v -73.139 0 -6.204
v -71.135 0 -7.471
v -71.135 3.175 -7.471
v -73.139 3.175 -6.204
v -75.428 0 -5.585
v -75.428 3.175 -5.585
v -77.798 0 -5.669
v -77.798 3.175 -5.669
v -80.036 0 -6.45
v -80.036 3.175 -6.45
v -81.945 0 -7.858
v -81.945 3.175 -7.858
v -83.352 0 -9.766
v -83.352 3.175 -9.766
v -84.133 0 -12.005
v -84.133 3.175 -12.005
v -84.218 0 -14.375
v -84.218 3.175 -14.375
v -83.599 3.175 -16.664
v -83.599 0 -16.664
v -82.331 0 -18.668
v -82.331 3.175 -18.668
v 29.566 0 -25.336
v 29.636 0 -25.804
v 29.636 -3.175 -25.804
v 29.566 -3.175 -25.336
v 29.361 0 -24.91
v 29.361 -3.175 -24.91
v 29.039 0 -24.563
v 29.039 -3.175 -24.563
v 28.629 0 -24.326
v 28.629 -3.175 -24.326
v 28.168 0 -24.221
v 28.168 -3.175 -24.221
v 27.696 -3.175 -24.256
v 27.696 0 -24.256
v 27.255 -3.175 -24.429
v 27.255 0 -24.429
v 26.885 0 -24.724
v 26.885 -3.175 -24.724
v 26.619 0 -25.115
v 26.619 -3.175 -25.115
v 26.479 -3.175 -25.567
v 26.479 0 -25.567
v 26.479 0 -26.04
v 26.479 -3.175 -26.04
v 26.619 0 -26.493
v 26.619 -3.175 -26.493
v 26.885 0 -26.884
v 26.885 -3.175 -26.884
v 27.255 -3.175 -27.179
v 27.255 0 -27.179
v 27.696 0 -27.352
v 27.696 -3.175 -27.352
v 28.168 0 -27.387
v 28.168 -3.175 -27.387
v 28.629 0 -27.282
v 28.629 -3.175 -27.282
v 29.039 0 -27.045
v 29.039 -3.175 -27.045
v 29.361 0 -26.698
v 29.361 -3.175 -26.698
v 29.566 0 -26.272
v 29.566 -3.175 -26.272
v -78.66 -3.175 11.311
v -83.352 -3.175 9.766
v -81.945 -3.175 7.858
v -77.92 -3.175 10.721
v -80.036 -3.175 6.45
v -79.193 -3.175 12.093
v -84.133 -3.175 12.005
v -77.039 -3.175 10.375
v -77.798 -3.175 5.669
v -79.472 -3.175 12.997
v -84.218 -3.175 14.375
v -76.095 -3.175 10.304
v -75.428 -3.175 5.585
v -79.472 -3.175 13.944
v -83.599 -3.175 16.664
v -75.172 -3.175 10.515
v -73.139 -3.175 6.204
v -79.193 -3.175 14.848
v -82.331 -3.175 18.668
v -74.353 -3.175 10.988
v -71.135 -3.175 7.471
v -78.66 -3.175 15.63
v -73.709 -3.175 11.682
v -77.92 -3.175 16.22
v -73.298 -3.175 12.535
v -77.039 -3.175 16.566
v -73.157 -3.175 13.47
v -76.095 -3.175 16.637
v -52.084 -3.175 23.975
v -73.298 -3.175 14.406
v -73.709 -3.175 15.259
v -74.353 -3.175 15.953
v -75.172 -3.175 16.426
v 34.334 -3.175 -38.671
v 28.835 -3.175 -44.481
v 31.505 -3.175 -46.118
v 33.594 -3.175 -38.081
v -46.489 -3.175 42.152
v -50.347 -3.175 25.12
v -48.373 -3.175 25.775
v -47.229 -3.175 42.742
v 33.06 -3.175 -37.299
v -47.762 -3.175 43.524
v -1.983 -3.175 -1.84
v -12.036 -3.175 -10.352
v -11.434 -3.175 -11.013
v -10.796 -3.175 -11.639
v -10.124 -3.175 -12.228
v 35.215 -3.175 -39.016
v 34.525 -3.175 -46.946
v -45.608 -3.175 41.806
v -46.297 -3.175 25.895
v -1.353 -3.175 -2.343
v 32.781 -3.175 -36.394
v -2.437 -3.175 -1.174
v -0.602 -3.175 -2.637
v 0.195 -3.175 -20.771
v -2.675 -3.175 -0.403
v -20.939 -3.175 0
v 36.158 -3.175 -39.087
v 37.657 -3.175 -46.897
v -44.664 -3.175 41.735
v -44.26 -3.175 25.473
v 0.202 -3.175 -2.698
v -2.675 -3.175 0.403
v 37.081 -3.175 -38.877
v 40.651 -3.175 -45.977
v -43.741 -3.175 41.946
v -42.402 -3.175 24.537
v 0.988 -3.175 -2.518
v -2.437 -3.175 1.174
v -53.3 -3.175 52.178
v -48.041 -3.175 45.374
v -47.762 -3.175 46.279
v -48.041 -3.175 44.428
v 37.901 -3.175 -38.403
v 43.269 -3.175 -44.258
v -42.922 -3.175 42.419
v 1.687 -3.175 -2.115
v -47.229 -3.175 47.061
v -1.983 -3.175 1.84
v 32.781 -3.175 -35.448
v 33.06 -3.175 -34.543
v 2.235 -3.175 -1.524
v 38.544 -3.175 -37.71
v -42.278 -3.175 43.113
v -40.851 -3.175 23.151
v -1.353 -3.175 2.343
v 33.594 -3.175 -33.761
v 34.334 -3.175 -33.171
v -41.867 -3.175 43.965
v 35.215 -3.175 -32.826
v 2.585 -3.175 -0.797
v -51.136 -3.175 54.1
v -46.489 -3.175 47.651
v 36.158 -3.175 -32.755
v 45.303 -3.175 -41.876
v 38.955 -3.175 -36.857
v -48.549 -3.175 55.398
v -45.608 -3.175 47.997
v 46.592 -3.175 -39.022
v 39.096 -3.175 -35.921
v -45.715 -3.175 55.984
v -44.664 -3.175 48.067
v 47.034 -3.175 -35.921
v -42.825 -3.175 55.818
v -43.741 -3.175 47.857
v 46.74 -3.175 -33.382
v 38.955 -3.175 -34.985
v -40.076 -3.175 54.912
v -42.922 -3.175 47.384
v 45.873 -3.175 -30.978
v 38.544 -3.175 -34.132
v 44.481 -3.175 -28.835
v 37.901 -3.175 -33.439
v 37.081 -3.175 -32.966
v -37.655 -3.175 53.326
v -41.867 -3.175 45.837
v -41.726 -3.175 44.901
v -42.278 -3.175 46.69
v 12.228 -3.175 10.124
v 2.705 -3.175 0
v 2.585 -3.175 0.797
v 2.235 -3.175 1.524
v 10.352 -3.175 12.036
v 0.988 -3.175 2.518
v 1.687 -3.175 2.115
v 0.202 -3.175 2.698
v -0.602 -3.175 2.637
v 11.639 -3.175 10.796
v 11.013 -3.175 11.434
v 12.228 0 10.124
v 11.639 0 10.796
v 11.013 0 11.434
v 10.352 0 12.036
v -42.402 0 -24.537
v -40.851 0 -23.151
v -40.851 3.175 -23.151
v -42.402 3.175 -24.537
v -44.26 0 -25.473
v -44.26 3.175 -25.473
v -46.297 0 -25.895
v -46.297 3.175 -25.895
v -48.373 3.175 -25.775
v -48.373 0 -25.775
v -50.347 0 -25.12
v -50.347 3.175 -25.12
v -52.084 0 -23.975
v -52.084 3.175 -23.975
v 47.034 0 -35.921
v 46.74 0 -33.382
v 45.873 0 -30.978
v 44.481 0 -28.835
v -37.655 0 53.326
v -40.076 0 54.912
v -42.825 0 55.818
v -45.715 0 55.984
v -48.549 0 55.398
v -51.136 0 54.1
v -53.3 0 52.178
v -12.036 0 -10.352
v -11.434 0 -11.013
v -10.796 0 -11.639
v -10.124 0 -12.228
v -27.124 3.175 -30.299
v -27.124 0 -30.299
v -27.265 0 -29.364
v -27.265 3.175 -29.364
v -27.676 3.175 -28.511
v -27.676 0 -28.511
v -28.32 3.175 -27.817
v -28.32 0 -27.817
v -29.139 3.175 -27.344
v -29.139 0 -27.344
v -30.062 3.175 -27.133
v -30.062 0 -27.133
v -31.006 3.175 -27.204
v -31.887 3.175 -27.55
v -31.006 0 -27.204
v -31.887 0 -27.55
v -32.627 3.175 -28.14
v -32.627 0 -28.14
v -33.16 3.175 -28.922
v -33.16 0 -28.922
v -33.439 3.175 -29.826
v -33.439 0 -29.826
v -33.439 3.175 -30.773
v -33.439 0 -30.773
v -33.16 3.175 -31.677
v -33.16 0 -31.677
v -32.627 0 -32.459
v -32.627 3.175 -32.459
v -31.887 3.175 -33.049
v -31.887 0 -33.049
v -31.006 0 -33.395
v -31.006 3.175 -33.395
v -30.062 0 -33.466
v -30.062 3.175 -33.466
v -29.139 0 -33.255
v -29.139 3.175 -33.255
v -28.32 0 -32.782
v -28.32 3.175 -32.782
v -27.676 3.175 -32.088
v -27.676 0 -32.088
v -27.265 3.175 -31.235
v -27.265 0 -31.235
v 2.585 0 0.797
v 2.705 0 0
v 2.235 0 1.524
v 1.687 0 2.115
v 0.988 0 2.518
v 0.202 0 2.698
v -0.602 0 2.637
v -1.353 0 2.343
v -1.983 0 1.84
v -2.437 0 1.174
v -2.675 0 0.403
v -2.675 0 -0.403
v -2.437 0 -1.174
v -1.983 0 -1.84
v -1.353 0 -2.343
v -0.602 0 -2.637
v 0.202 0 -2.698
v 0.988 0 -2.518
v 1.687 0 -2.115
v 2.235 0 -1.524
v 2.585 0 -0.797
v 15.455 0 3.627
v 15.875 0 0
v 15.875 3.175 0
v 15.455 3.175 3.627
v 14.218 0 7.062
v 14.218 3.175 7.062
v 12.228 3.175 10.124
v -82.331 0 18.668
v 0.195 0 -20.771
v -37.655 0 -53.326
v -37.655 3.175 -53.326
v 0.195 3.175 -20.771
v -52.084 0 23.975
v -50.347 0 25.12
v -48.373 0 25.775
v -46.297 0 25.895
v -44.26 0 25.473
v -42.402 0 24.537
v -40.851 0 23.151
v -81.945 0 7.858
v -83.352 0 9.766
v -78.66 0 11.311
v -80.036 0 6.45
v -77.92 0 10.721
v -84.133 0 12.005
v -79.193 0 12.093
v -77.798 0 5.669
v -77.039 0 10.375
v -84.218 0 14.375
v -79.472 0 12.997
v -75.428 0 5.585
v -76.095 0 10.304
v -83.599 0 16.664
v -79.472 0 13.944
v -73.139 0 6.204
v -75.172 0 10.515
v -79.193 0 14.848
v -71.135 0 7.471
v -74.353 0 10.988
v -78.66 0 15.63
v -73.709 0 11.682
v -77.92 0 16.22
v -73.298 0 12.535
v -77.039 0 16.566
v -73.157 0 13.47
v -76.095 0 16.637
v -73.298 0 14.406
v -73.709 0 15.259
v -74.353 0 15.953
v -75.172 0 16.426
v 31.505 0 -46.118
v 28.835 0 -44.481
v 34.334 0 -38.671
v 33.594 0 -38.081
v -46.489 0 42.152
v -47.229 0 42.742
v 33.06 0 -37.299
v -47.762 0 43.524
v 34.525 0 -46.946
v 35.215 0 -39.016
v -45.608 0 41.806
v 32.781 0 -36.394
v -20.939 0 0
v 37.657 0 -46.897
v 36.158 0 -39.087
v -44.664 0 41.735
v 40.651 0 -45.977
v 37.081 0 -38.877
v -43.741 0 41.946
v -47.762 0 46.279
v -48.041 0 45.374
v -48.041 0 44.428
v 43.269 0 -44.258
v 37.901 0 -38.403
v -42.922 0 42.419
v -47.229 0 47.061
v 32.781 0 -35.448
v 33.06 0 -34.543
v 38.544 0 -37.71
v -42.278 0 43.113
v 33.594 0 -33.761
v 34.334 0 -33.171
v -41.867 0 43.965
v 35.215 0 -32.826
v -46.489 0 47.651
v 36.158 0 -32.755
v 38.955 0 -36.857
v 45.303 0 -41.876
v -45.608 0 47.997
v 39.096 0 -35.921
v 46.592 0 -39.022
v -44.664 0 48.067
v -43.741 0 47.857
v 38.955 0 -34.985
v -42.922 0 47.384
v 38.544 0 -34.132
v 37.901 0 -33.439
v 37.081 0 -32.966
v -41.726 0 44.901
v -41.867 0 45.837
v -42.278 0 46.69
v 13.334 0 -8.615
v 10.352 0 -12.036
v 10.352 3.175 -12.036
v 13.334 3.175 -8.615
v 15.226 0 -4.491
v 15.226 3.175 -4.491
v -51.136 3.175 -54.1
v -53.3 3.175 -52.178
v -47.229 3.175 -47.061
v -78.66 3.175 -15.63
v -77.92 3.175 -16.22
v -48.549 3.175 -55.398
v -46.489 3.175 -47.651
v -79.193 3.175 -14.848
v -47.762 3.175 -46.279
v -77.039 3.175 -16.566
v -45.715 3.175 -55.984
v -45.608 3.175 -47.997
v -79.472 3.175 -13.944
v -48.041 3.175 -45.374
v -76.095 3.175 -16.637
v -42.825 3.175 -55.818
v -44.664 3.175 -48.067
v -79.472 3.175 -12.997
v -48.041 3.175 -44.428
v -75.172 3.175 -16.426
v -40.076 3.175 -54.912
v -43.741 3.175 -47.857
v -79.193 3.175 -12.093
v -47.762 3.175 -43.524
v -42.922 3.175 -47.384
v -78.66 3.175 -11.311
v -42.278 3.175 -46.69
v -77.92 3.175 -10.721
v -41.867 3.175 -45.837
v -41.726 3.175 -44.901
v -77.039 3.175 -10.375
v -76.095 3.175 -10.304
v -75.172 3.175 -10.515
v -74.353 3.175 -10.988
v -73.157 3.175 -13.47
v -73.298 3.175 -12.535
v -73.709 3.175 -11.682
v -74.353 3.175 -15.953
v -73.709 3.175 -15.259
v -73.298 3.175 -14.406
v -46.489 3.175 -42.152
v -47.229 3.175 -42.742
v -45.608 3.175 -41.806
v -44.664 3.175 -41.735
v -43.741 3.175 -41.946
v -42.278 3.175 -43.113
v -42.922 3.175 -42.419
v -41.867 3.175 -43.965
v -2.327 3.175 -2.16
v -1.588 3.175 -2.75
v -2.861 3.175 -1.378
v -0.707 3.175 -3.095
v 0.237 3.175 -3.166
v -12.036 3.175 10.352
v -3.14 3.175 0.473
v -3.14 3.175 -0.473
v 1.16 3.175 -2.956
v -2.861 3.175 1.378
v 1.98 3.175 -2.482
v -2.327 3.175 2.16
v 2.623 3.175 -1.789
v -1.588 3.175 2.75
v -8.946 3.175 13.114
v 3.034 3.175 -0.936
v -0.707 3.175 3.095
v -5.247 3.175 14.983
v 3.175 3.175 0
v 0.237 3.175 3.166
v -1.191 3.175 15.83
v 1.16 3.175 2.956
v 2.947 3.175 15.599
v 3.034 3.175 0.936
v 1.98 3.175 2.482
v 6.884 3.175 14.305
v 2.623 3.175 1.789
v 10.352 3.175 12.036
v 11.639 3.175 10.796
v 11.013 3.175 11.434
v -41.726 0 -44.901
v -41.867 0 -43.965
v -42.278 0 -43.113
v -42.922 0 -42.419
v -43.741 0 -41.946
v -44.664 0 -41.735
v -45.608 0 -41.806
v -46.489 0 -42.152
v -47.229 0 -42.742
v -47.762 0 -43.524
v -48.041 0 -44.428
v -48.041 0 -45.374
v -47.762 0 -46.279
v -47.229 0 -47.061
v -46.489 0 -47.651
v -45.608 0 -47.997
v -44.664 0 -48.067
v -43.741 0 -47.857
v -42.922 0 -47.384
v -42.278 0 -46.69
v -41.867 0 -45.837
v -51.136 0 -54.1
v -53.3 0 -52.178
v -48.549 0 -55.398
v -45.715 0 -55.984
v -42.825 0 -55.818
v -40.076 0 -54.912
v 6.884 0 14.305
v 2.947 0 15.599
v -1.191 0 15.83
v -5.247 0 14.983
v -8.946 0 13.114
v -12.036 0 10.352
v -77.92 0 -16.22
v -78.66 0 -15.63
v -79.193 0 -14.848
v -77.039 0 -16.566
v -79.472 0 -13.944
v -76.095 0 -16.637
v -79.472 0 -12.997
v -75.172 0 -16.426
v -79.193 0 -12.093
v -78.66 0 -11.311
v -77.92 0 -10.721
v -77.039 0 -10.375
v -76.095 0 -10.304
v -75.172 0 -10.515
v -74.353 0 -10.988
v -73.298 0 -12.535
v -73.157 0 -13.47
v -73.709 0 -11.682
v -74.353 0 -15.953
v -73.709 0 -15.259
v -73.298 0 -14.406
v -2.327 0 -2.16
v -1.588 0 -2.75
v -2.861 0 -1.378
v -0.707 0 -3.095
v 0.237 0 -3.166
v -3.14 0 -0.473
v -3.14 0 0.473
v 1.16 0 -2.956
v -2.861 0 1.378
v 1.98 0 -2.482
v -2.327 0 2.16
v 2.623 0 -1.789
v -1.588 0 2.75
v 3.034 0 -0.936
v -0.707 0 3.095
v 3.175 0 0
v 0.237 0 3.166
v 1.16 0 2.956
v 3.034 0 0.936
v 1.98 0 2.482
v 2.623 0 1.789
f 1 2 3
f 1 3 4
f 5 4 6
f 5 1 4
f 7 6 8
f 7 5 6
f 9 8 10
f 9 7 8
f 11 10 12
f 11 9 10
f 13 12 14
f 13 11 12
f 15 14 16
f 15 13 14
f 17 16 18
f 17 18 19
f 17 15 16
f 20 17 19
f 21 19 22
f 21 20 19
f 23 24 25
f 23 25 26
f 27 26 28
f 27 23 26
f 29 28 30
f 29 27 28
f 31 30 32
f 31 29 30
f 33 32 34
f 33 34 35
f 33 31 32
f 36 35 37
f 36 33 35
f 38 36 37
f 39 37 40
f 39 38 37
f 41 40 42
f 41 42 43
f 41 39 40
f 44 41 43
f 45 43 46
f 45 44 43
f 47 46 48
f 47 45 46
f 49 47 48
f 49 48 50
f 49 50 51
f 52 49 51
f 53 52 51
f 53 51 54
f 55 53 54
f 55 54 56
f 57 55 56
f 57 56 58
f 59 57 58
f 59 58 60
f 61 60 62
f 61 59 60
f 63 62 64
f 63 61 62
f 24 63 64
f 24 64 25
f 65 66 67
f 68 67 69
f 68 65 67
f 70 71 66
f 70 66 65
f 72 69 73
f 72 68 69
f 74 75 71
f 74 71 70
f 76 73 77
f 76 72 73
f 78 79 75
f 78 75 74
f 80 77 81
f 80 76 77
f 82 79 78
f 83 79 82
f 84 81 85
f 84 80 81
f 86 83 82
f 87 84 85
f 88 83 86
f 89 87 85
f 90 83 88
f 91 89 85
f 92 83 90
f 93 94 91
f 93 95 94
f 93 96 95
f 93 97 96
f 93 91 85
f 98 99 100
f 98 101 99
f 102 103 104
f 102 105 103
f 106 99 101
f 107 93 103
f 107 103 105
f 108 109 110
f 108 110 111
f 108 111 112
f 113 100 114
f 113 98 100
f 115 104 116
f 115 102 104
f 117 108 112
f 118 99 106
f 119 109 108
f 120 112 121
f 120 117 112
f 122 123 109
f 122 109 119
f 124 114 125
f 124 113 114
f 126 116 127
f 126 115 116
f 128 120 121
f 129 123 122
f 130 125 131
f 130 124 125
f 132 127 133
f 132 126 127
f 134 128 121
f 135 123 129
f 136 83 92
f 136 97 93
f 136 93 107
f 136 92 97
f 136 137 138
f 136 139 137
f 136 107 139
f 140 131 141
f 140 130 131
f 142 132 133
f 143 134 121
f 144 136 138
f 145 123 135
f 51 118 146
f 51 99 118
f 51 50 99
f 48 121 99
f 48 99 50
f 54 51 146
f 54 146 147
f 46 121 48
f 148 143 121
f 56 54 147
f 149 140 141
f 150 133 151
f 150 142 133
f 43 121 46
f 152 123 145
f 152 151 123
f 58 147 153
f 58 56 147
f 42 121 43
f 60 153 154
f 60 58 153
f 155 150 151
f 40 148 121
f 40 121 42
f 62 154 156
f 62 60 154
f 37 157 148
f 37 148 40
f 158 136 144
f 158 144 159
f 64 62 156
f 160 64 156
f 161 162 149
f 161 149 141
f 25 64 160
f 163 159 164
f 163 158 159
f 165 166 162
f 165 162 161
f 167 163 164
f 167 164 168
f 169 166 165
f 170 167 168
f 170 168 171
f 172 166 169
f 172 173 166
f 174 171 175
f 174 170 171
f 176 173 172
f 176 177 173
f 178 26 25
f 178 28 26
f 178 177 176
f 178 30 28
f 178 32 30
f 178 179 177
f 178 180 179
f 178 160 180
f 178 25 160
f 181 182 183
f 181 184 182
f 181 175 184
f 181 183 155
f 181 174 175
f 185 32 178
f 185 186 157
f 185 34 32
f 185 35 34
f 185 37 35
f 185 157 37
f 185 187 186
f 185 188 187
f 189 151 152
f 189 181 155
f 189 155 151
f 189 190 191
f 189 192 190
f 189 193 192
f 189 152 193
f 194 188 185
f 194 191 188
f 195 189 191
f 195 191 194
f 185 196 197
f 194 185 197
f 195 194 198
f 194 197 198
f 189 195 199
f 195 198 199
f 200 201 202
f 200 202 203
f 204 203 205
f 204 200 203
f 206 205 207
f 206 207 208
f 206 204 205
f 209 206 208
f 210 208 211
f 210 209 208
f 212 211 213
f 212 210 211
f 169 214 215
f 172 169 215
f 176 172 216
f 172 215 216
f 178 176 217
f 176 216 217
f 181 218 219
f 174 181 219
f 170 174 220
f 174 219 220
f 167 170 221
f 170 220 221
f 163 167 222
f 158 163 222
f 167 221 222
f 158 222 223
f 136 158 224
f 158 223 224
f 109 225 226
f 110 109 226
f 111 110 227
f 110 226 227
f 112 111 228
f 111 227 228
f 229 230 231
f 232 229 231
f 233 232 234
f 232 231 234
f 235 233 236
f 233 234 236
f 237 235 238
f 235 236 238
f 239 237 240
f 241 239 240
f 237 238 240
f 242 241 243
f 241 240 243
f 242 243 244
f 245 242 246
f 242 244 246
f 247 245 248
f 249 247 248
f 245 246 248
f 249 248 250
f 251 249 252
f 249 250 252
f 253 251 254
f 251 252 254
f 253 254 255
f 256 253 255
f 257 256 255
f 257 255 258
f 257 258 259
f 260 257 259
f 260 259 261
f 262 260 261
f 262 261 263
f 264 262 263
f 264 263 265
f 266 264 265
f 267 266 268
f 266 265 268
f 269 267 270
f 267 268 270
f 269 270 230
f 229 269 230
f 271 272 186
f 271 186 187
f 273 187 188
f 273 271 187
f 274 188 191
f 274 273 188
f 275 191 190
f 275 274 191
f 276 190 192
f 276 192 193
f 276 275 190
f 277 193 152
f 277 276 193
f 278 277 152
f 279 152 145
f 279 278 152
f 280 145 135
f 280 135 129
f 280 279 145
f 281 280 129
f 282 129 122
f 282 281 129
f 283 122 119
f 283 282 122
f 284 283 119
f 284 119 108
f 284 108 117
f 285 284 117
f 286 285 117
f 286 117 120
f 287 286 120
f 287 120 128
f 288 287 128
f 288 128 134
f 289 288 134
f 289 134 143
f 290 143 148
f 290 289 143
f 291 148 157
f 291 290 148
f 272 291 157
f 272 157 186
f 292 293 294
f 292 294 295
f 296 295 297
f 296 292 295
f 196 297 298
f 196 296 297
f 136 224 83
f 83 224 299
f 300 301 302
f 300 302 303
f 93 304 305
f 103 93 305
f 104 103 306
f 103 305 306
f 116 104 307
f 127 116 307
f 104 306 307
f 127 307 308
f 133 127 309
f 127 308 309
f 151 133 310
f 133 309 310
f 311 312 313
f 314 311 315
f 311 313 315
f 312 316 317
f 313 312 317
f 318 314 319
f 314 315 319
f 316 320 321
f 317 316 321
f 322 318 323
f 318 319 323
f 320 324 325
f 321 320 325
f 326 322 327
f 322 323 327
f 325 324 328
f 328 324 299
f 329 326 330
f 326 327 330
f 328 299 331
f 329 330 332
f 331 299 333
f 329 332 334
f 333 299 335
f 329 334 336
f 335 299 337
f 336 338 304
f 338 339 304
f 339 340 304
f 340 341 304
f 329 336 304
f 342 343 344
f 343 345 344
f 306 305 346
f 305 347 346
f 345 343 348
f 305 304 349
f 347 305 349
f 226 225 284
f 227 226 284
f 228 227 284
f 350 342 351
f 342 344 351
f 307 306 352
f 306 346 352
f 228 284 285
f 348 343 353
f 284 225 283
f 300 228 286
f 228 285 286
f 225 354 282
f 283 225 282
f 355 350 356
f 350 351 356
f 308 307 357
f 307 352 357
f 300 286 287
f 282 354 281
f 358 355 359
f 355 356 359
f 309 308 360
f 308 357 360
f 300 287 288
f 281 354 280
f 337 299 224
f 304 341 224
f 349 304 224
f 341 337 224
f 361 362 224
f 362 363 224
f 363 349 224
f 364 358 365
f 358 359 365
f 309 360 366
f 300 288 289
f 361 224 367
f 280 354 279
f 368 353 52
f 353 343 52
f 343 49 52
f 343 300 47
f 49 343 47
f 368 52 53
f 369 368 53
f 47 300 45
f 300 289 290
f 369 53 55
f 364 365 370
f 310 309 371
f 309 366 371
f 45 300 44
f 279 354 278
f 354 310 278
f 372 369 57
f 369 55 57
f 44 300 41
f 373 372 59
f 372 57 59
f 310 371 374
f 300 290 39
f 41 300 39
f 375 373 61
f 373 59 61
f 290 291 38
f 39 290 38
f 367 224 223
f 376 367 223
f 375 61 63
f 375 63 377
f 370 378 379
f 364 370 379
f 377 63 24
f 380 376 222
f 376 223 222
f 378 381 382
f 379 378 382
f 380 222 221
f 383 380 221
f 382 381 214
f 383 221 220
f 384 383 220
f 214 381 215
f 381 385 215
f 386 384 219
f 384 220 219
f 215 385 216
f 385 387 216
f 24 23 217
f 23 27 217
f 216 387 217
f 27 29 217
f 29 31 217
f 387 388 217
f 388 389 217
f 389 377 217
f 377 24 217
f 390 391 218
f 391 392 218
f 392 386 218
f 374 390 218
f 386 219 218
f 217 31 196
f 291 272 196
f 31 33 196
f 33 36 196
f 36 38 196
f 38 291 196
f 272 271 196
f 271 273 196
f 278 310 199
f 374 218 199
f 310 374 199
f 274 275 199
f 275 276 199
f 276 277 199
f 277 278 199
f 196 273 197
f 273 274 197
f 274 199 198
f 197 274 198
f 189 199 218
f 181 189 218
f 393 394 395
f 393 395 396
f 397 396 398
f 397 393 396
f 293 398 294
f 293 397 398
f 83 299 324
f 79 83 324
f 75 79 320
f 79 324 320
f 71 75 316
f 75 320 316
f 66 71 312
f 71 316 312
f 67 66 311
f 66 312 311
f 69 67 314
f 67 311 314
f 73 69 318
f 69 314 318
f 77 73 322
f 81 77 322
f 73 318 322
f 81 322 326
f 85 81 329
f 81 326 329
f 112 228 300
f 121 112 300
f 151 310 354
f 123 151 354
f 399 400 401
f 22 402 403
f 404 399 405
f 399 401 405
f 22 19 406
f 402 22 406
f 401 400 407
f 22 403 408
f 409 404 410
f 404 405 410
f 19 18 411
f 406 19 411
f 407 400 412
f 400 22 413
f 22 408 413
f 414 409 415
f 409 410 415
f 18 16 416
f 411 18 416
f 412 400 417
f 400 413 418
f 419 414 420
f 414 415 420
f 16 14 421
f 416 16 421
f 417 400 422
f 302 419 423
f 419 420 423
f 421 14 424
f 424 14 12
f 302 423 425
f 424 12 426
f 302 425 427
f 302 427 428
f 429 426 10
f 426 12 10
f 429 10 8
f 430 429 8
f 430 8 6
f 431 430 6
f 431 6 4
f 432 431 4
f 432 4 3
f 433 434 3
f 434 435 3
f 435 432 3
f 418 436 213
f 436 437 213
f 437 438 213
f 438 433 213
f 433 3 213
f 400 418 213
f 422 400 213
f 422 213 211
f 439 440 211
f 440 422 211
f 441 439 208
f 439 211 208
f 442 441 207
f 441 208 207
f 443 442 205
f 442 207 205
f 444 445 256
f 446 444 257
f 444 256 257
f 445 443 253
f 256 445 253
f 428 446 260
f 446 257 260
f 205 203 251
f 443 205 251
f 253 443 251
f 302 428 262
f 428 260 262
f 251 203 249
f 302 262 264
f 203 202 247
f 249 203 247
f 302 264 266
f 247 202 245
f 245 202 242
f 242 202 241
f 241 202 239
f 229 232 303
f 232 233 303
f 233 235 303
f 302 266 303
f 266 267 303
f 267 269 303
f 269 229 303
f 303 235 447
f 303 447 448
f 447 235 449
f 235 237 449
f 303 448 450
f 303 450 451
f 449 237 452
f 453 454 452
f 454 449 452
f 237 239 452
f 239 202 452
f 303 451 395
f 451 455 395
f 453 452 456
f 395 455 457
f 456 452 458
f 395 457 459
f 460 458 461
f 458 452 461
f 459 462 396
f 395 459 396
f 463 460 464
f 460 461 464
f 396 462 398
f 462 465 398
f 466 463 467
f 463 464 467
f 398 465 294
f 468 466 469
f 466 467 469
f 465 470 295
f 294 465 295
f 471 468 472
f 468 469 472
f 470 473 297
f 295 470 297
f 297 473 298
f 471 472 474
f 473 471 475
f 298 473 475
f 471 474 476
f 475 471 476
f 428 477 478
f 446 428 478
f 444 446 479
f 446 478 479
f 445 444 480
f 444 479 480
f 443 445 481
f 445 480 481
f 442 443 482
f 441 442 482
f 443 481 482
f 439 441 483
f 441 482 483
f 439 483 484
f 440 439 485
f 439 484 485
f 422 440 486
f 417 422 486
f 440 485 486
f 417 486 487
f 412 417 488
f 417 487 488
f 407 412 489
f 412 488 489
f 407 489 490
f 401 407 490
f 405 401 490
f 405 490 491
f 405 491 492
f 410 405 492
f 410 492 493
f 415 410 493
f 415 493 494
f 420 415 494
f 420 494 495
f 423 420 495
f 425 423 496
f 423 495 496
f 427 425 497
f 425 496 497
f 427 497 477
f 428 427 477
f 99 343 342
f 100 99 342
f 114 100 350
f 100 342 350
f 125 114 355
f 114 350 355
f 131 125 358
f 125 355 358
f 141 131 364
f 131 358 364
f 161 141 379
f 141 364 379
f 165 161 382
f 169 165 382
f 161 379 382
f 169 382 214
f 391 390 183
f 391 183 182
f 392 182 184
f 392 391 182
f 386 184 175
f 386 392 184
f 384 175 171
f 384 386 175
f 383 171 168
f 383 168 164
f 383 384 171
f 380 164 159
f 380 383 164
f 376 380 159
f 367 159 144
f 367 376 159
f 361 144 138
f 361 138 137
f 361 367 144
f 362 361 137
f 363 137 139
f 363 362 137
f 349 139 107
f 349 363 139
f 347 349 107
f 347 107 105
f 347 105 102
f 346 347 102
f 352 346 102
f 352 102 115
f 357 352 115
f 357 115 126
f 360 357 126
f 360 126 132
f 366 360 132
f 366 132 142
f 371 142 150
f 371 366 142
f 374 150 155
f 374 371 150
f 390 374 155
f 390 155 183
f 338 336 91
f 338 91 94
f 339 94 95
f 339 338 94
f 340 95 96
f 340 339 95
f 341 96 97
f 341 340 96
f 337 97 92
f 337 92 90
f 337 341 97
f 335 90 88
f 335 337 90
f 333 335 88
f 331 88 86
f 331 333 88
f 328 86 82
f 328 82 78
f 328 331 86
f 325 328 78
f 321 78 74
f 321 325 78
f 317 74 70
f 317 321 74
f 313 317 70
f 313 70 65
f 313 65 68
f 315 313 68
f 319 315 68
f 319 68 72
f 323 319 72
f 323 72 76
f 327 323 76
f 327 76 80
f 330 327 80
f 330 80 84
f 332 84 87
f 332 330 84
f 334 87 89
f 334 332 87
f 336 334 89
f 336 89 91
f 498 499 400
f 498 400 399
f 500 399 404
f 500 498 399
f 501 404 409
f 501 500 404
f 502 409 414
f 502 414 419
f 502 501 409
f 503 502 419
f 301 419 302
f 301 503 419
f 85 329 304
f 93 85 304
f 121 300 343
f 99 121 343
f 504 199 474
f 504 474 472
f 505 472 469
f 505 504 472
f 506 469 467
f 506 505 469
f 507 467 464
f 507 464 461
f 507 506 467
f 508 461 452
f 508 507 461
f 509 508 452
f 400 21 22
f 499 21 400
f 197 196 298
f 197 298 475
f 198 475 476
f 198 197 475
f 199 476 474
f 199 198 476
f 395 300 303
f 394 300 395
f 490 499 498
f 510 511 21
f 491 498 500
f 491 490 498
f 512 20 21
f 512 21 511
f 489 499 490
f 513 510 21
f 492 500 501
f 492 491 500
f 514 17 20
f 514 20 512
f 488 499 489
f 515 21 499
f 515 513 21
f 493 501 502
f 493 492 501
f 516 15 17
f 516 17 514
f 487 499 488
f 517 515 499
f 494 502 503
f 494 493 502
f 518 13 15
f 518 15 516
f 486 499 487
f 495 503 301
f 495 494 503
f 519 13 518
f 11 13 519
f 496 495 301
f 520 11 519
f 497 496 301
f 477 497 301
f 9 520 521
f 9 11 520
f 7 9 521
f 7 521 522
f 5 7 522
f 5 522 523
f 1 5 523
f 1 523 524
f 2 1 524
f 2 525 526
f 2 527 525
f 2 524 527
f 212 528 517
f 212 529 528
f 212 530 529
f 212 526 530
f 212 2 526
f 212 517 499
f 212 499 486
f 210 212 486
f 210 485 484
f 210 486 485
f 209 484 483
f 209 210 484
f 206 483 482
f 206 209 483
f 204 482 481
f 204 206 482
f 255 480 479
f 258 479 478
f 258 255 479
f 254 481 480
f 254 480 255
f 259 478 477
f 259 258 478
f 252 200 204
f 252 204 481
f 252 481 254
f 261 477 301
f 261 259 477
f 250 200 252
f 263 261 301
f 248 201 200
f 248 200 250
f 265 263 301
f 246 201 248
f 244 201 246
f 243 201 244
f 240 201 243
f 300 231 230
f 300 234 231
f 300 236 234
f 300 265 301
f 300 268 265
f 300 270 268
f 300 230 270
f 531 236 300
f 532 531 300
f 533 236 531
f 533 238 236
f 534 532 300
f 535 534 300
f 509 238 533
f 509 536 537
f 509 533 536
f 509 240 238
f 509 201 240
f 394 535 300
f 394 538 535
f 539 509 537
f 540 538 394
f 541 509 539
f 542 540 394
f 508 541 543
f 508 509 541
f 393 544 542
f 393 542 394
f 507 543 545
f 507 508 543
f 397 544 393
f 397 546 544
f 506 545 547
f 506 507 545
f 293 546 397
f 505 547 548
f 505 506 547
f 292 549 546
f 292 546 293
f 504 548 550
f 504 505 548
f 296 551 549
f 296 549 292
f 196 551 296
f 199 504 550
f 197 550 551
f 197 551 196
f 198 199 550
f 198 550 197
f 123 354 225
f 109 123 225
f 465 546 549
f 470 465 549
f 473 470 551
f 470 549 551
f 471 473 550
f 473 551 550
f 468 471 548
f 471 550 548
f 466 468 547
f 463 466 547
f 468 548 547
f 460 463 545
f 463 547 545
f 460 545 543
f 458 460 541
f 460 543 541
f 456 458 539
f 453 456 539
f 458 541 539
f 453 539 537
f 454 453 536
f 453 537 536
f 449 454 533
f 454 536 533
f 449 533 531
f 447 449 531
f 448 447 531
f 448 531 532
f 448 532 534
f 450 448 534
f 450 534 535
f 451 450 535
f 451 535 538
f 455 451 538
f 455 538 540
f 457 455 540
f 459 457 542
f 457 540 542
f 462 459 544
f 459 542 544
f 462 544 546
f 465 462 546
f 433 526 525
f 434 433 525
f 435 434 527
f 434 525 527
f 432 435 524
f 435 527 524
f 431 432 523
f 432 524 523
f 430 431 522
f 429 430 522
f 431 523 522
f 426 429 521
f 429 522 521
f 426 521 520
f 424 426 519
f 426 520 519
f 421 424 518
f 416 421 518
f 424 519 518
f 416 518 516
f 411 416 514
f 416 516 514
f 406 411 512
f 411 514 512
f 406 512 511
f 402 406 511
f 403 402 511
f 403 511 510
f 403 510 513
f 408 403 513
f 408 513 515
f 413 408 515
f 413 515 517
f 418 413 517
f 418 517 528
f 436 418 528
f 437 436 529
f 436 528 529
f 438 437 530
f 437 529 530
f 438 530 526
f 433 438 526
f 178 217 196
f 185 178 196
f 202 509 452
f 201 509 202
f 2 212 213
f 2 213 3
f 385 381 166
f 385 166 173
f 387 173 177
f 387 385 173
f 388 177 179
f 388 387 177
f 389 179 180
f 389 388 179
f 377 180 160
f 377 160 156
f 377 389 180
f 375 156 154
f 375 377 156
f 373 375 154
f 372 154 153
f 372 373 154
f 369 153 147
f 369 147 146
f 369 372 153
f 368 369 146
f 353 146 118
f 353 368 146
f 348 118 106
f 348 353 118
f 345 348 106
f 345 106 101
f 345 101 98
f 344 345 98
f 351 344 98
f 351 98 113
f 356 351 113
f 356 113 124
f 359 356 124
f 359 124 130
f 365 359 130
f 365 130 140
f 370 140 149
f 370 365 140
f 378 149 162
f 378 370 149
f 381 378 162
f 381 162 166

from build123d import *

# Parameters (mm, degrees)
F0_R     = 3.175
F0_R_2   = 2.7051
F0_R_3   = 1.5875
F1_DEPTH = 3.175
F2_DEPTH = 3.175


with BuildPart() as f1:
    # F0 (on Front) → F1 (new body)
    with BuildSketch(Plane.XZ):
        with BuildLine():
            ThreePointArc((-71.1347575644, 7.4711561347), (-69.1121208226, 10.1727039932), (-68.3946770291, 13.4703841816))
            ThreePointArc((-68.3946770291, 13.4703841816), (-73.5586383483, 20.9075469092), (-82.331405076, 18.6678036462))
            ThreePointArc((-82.331405076, 18.6678036462), (-81.9448371048, 7.8577241059), (-71.1347575644, 7.4711561347))
        make_face()
        with Locations((-76.3321770291, 13.4703841816)):
            Circle(F0_R, mode=Mode.SUBTRACT)
        with BuildLine():
            ThreePointArc((-37.655016822, 53.3262030046), (-45.7148756595, 55.9839571475), (-53.300199871, 52.1776678558))
            ThreePointArc((-53.300199871, 52.1776678558), (-56.0137627922, 44.9211777548), (-53.3262030046, 37.655016822))
            ThreePointArc((-53.3262030046, 37.655016822), (-41.0369756168, 34.4823169714), (-33.7887806053, 44.9012806053))
            ThreePointArc((-33.7887806053, 44.9012806053), (-34.8014845049, 49.5361241819), (-37.655016822, 53.3262030046))
        make_face()
        with Locations((-44.9012806053, 44.9012806053)):
            Circle(F0_R, mode=Mode.SUBTRACT)
        with BuildLine():
            ThreePointArc((-82.331405076, 18.6678036462), (-73.5586383483, 20.9075469092), (-68.3946770291, 13.4703841816))
            ThreePointArc((-68.3946770291, 13.4703841816), (-69.1121208226, 10.1727039932), (-71.1347575644, 7.4711561347))
            Line((-71.1347575644, 7.4711561347), (-52.0843267669, 23.9754595323))
            ThreePointArc((-52.0843267669, 23.9754595323), (-46.2965222838, 25.8954961667), (-40.8511612346, 23.1508168672))
            Line((-40.8511612346, 23.1508168672), (-53.3262030046, 37.655016822))
            ThreePointArc((-53.3262030046, 37.655016822), (-56.0137627922, 44.9211777548), (-53.300199871, 52.1776678558))
            Line((-53.300199871, 52.1776678558), (-82.331405076, 18.6678036462))
        make_face()
        with BuildLine():
            Line((-12.0356033823, 10.3518054572), (-20.9391765456, 0))
            Line((-20.9391765456, 0), (-12.0356034274, -10.3518054047))
            ThreePointArc((-12.0356034274, -10.3518054047), (-15.875, 3.46e-08), (-12.0356033823, 10.3518054572))
        make_face()
        with BuildLine():
            ThreePointArc((12.2282550252, 10.1235074968), (11.3304373246, 11.1192092809), (10.3518054047, 12.0356034274))
            ThreePointArc((10.3518054047, 12.0356034274), (-1.1906249655, 15.830288601), (-12.0356033823, 10.3518054572))
            ThreePointArc((-12.0356033823, 10.3518054572), (-15.875, 3.46e-08), (-12.0356034274, -10.3518054047))
            ThreePointArc((-12.0356034274, -10.3518054047), (-11.1192092809, -11.3304373246), (-10.1235074968, -12.2282550252))
            ThreePointArc((-10.1235074968, -12.2282550252), (0.1493610759, -15.8742973473), (10.3518058503, -12.0356030442))
            ThreePointArc((10.3518058503, -12.0356030442), (14.4282802661, -6.6212048423), (15.875, 0))
            ThreePointArc((15.875, 0), (14.9355142785, 5.3801522504), (12.2282550252, 10.1235074968))
        make_face()
        Circle(F0_R, mode=Mode.SUBTRACT)
        Circle(F0_R)
        Circle(F0_R_2, mode=Mode.SUBTRACT)
        with BuildLine():
            Line((44.4808030019, -28.8345692365), (12.2282550252, 10.1235074968))
            ThreePointArc((12.2282550252, 10.1235074968), (14.9355142785, 5.3801522504), (15.875, 0))
            ThreePointArc((15.875, 0), (14.4282802661, -6.6212048423), (10.3518058503, -12.0356030442))
            Line((10.3518058503, -12.0356030442), (0.1954344954, -20.7710836138))
            Line((0.1954344954, -20.7710836138), (28.8345692365, -44.4808030019))
            ThreePointArc((28.8345692365, -44.4808030019), (28.0633003783, -28.0633003783), (44.4808030019, -28.8345692365))
        make_face()
        with Locations((28.0488921947, -25.8038281644)):
            Circle(F0_R_3, mode=Mode.SUBTRACT)
        with BuildLine():
            ThreePointArc((10.3518058503, -12.0356030442), (0.1493610759, -15.8742973473), (-10.1235074968, -12.2282550252))
            Line((-10.1235074968, -12.2282550252), (0.1954344954, -20.7710836138))
            Line((0.1954344954, -20.7710836138), (10.3518058503, -12.0356030442))
        make_face()
        with BuildLine():
            ThreePointArc((47.0335244843, -35.9210244843), (46.3758844792, -32.154917909), (44.4808030019, -28.8345692365))
            ThreePointArc((44.4808030019, -28.8345692365), (28.0633003783, -28.0633003783), (28.8345692365, -44.4808030019))
            ThreePointArc((28.8345692365, -44.4808030019), (40.650687385, -45.9767663811), (47.0335244843, -35.9210244843))
        make_face()
        with Locations((35.9210244843, -35.9210244843)):
            Circle(F0_R, mode=Mode.SUBTRACT)
        with BuildLine():
            Line((10.3518054047, 12.0356034274), (-37.655016822, 53.3262030046))
            ThreePointArc((-37.655016822, 53.3262030046), (-34.8014845049, 49.5361241819), (-33.7887806053, 44.9012806053))
            ThreePointArc((-33.7887806053, 44.9012806053), (-41.0369756168, 34.4823169714), (-53.3262030046, 37.655016822))
            Line((-53.3262030046, 37.655016822), (-40.8511612346, 23.1508168672))
            Line((-40.8511612346, 23.1508168672), (-20.9391765456, 0))
            Line((-20.9391765456, 0), (-12.0356033823, 10.3518054572))
            ThreePointArc((-12.0356033823, 10.3518054572), (-1.1906249655, 15.830288601), (10.3518054047, 12.0356034274))
        make_face()
    extrude(amount=F1_DEPTH)


with BuildPart() as f2:
    # F0 (on Front) → F2 (new body)
    with BuildSketch(Plane.XZ):
        with BuildLine():
            ThreePointArc((-53.300199871, -52.1776678558), (-45.7148756595, -55.9839571475), (-37.655016822, -53.3262030046))
            ThreePointArc((-37.655016822, -53.3262030046), (-34.8014845049, -49.5361241819), (-33.7887806053, -44.9012806053))
            ThreePointArc((-33.7887806053, -44.9012806053), (-48.7842347585, -34.4892527868), (-53.300199871, -52.1776678558))
        make_face()
        with Locations((-44.9012806053, -44.9012806053)):
            Circle(F0_R, mode=Mode.SUBTRACT)
        with BuildLine():
            ThreePointArc((12.2282550252, 10.1235074968), (11.3304373246, 11.1192092809), (10.3518054047, 12.0356034274))
            ThreePointArc((10.3518054047, 12.0356034274), (-1.1906249655, 15.830288601), (-12.0356033823, 10.3518054572))
            ThreePointArc((-12.0356033823, 10.3518054572), (-15.875, 3.46e-08), (-12.0356034274, -10.3518054047))
            ThreePointArc((-12.0356034274, -10.3518054047), (-11.1192092809, -11.3304373246), (-10.1235074968, -12.2282550252))
            ThreePointArc((-10.1235074968, -12.2282550252), (0.1493610759, -15.8742973473), (10.3518058503, -12.0356030442))
            ThreePointArc((10.3518058503, -12.0356030442), (14.4282802661, -6.6212048423), (15.875, 0))
            ThreePointArc((15.875, 0), (14.9355142785, 5.3801522504), (12.2282550252, 10.1235074968))
        make_face()
        Circle(F0_R, mode=Mode.SUBTRACT)
        with BuildLine():
            Line((-12.0356033823, 10.3518054572), (-20.9391765456, 0))
            Line((-20.9391765456, 0), (-12.0356034274, -10.3518054047))
            ThreePointArc((-12.0356034274, -10.3518054047), (-15.875, 3.46e-08), (-12.0356033823, 10.3518054572))
        make_face()
        with BuildLine():
            ThreePointArc((10.3518058503, -12.0356030442), (0.1493610759, -15.8742973473), (-10.1235074968, -12.2282550252))
            Line((-10.1235074968, -12.2282550252), (0.1954344954, -20.7710836138))
            Line((0.1954344954, -20.7710836138), (10.3518058503, -12.0356030442))
        make_face()
        with BuildLine():
            ThreePointArc((-68.3946770291, -13.4703841816), (-69.1121208226, -10.1727039932), (-71.1347575644, -7.4711561347))
            ThreePointArc((-71.1347575644, -7.4711561347), (-81.9448371048, -7.8577241059), (-82.331405076, -18.6678036462))
            ThreePointArc((-82.331405076, -18.6678036462), (-73.5586383483, -20.9075469092), (-68.3946770291, -13.4703841816))
        make_face()
        with Locations((-76.3321770291, -13.4703841816)):
            Circle(F0_R, mode=Mode.SUBTRACT)
        with BuildLine():
            Line((-12.0356034274, -10.3518054047), (-20.9391765456, 0))
            Line((-20.9391765456, 0), (-40.8511612346, -23.1508168672))
            ThreePointArc((-40.8511612346, -23.1508168672), (-46.2965222838, -25.8954961667), (-52.0843267669, -23.9754595323))
            Line((-52.0843267669, -23.9754595323), (-71.1347575644, -7.4711561347))
            ThreePointArc((-71.1347575644, -7.4711561347), (-69.1121208226, -10.1727039932), (-68.3946770291, -13.4703841816))
            ThreePointArc((-68.3946770291, -13.4703841816), (-73.5586383483, -20.9075469092), (-82.331405076, -18.6678036462))
            Line((-82.331405076, -18.6678036462), (-53.300199871, -52.1776678558))
            ThreePointArc((-53.300199871, -52.1776678558), (-48.7842347585, -34.4892527868), (-33.7887806053, -44.9012806053))
            ThreePointArc((-33.7887806053, -44.9012806053), (-34.8014845049, -49.5361241819), (-37.655016822, -53.3262030046))
            Line((-37.655016822, -53.3262030046), (0.1954344954, -20.7710836138))
            Line((0.1954344954, -20.7710836138), (-10.1235074968, -12.2282550252))
            ThreePointArc((-10.1235074968, -12.2282550252), (-11.1192092809, -11.3304373246), (-12.0356034274, -10.3518054047))
        make_face()
        with Locations((-30.2993841525, -30.2993841525)):
            Circle(F0_R, mode=Mode.SUBTRACT)
    extrude(amount=-F2_DEPTH)


solid = Compound([f1.part, f2.part])
